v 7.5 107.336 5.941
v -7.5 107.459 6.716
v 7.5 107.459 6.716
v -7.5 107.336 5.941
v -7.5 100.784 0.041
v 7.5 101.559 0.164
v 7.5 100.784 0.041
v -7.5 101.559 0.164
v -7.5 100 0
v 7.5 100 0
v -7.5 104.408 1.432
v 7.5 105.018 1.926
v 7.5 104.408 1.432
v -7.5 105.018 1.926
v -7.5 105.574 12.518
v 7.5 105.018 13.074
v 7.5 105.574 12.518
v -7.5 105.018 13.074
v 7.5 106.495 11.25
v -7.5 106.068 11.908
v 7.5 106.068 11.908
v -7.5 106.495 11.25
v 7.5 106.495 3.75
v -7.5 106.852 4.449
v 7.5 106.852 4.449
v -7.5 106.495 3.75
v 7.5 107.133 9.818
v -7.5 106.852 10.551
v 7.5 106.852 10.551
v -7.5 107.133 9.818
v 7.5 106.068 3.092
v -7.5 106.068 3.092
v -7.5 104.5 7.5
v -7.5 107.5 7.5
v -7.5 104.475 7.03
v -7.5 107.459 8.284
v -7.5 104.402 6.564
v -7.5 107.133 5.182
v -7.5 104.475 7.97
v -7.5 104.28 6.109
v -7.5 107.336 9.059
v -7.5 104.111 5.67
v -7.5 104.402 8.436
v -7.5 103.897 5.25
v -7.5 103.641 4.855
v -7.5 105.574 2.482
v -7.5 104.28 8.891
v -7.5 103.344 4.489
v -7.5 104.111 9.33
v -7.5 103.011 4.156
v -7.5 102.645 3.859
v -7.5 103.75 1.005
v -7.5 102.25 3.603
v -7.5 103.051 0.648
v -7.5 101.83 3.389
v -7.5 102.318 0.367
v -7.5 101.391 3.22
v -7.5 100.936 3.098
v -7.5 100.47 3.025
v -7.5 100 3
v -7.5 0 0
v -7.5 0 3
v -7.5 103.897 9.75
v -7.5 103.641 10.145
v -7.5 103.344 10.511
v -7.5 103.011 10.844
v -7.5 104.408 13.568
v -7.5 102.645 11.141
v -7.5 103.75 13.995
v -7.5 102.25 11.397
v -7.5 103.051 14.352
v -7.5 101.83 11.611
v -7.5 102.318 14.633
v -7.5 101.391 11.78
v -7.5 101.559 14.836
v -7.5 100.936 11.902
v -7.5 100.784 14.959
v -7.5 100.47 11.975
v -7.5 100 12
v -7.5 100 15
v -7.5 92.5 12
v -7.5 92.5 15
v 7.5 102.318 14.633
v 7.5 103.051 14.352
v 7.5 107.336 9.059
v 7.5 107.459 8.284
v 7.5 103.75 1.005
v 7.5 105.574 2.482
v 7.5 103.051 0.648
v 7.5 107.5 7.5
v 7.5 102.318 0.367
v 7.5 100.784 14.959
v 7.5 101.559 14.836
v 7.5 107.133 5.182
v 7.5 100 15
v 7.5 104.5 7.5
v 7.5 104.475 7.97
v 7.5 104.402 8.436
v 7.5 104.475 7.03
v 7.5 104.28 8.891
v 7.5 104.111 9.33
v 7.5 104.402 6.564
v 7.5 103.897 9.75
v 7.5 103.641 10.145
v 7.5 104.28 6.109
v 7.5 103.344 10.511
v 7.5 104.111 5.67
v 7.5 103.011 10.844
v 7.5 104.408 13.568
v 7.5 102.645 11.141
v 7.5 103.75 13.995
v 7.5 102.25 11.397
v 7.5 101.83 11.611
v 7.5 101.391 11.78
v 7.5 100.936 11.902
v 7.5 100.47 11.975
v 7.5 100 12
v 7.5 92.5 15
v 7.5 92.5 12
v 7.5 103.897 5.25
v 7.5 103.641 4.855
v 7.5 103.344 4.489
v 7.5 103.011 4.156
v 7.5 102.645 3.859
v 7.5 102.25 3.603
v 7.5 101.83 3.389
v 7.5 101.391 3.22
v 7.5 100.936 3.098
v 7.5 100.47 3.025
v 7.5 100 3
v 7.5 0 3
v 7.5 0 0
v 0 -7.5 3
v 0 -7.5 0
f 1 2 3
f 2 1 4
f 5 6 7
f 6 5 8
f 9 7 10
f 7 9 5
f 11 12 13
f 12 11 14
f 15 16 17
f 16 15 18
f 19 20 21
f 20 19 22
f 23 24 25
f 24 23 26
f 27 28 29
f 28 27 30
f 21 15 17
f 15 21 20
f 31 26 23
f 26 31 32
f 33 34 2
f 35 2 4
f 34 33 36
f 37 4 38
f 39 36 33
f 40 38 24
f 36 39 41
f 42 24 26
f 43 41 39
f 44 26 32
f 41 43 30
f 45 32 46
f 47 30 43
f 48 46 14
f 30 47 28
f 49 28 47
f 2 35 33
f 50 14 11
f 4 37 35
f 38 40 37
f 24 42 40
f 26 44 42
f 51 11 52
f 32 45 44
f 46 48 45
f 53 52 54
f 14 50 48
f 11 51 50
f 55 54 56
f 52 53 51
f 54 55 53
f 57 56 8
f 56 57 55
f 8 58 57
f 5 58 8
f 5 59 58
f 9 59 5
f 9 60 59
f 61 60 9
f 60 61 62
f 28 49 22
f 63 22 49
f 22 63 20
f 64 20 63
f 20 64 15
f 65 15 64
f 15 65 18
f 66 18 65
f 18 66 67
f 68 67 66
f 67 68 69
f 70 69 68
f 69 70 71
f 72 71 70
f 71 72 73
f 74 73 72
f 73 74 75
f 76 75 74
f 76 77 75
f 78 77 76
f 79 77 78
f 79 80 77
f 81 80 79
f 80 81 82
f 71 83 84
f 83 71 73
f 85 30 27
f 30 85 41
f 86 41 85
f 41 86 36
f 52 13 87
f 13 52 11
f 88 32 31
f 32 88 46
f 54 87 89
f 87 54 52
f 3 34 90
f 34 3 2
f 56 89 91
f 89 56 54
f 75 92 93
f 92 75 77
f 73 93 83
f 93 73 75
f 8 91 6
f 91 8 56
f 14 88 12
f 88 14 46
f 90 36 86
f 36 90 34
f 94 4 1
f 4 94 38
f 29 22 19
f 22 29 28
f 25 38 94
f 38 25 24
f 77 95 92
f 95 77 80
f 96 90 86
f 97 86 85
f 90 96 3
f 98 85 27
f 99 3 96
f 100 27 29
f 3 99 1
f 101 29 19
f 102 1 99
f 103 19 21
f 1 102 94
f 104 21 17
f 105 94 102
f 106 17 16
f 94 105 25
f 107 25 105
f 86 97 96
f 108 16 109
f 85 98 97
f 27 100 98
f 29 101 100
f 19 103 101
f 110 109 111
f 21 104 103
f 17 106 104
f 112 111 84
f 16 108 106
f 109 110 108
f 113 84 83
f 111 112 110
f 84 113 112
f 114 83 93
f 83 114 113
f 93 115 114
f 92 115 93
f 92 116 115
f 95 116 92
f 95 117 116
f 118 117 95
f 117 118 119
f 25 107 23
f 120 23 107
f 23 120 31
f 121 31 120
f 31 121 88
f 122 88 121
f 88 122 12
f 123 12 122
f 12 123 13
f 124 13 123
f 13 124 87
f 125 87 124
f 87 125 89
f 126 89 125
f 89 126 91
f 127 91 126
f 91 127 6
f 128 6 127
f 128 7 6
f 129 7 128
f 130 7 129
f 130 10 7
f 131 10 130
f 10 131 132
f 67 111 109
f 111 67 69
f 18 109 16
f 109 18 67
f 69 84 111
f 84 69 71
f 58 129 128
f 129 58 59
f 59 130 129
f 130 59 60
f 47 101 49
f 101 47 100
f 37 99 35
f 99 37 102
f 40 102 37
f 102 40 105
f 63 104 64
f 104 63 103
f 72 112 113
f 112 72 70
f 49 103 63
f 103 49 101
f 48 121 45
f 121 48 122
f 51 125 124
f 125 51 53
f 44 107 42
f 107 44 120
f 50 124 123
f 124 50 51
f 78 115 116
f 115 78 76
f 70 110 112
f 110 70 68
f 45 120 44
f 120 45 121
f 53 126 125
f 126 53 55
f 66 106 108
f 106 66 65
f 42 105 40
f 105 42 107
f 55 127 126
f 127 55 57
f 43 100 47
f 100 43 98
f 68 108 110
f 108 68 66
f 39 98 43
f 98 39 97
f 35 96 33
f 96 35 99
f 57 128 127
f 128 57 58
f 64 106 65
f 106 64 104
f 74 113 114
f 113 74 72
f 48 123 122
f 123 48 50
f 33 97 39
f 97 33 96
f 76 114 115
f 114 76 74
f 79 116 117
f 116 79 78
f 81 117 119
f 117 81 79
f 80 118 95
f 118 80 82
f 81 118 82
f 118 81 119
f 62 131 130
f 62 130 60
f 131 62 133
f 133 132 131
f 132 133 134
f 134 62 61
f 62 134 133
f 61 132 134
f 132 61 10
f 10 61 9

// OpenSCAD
$fn = 60;

Width = 15;
Height = 100;
Thickness = 3;

union() {
  linear_extrude(Thickness) union() {
    rotate(0) circle(r=Width / 2, $fn=4);
    translate([-Width / 2, 0, 0]) square([Width, Height]);
  }

  // color("green") linear_extrude(10) translate([-Thickness / 2, 0, 0]) square([Thickness, Height]);

  translate([0, Height, Width / 2]) rotate([0, 90, 0]) 
    union() {
      difference() {
        cylinder(r=Width / 2, h=Width, center=true);
        scale([0.6, 0.6, 1.1]) cylinder(r=Width / 2, h=Width, center=true);
        translate([0, -Width / 4, 0]) cube([Width, Width / 2, Width + 1], center=true);
      }
      translate([-Width/2 + Thickness/2, -Width / 4, 0])cube([Thickness, Width/2, Width], center=true);
    }
}
